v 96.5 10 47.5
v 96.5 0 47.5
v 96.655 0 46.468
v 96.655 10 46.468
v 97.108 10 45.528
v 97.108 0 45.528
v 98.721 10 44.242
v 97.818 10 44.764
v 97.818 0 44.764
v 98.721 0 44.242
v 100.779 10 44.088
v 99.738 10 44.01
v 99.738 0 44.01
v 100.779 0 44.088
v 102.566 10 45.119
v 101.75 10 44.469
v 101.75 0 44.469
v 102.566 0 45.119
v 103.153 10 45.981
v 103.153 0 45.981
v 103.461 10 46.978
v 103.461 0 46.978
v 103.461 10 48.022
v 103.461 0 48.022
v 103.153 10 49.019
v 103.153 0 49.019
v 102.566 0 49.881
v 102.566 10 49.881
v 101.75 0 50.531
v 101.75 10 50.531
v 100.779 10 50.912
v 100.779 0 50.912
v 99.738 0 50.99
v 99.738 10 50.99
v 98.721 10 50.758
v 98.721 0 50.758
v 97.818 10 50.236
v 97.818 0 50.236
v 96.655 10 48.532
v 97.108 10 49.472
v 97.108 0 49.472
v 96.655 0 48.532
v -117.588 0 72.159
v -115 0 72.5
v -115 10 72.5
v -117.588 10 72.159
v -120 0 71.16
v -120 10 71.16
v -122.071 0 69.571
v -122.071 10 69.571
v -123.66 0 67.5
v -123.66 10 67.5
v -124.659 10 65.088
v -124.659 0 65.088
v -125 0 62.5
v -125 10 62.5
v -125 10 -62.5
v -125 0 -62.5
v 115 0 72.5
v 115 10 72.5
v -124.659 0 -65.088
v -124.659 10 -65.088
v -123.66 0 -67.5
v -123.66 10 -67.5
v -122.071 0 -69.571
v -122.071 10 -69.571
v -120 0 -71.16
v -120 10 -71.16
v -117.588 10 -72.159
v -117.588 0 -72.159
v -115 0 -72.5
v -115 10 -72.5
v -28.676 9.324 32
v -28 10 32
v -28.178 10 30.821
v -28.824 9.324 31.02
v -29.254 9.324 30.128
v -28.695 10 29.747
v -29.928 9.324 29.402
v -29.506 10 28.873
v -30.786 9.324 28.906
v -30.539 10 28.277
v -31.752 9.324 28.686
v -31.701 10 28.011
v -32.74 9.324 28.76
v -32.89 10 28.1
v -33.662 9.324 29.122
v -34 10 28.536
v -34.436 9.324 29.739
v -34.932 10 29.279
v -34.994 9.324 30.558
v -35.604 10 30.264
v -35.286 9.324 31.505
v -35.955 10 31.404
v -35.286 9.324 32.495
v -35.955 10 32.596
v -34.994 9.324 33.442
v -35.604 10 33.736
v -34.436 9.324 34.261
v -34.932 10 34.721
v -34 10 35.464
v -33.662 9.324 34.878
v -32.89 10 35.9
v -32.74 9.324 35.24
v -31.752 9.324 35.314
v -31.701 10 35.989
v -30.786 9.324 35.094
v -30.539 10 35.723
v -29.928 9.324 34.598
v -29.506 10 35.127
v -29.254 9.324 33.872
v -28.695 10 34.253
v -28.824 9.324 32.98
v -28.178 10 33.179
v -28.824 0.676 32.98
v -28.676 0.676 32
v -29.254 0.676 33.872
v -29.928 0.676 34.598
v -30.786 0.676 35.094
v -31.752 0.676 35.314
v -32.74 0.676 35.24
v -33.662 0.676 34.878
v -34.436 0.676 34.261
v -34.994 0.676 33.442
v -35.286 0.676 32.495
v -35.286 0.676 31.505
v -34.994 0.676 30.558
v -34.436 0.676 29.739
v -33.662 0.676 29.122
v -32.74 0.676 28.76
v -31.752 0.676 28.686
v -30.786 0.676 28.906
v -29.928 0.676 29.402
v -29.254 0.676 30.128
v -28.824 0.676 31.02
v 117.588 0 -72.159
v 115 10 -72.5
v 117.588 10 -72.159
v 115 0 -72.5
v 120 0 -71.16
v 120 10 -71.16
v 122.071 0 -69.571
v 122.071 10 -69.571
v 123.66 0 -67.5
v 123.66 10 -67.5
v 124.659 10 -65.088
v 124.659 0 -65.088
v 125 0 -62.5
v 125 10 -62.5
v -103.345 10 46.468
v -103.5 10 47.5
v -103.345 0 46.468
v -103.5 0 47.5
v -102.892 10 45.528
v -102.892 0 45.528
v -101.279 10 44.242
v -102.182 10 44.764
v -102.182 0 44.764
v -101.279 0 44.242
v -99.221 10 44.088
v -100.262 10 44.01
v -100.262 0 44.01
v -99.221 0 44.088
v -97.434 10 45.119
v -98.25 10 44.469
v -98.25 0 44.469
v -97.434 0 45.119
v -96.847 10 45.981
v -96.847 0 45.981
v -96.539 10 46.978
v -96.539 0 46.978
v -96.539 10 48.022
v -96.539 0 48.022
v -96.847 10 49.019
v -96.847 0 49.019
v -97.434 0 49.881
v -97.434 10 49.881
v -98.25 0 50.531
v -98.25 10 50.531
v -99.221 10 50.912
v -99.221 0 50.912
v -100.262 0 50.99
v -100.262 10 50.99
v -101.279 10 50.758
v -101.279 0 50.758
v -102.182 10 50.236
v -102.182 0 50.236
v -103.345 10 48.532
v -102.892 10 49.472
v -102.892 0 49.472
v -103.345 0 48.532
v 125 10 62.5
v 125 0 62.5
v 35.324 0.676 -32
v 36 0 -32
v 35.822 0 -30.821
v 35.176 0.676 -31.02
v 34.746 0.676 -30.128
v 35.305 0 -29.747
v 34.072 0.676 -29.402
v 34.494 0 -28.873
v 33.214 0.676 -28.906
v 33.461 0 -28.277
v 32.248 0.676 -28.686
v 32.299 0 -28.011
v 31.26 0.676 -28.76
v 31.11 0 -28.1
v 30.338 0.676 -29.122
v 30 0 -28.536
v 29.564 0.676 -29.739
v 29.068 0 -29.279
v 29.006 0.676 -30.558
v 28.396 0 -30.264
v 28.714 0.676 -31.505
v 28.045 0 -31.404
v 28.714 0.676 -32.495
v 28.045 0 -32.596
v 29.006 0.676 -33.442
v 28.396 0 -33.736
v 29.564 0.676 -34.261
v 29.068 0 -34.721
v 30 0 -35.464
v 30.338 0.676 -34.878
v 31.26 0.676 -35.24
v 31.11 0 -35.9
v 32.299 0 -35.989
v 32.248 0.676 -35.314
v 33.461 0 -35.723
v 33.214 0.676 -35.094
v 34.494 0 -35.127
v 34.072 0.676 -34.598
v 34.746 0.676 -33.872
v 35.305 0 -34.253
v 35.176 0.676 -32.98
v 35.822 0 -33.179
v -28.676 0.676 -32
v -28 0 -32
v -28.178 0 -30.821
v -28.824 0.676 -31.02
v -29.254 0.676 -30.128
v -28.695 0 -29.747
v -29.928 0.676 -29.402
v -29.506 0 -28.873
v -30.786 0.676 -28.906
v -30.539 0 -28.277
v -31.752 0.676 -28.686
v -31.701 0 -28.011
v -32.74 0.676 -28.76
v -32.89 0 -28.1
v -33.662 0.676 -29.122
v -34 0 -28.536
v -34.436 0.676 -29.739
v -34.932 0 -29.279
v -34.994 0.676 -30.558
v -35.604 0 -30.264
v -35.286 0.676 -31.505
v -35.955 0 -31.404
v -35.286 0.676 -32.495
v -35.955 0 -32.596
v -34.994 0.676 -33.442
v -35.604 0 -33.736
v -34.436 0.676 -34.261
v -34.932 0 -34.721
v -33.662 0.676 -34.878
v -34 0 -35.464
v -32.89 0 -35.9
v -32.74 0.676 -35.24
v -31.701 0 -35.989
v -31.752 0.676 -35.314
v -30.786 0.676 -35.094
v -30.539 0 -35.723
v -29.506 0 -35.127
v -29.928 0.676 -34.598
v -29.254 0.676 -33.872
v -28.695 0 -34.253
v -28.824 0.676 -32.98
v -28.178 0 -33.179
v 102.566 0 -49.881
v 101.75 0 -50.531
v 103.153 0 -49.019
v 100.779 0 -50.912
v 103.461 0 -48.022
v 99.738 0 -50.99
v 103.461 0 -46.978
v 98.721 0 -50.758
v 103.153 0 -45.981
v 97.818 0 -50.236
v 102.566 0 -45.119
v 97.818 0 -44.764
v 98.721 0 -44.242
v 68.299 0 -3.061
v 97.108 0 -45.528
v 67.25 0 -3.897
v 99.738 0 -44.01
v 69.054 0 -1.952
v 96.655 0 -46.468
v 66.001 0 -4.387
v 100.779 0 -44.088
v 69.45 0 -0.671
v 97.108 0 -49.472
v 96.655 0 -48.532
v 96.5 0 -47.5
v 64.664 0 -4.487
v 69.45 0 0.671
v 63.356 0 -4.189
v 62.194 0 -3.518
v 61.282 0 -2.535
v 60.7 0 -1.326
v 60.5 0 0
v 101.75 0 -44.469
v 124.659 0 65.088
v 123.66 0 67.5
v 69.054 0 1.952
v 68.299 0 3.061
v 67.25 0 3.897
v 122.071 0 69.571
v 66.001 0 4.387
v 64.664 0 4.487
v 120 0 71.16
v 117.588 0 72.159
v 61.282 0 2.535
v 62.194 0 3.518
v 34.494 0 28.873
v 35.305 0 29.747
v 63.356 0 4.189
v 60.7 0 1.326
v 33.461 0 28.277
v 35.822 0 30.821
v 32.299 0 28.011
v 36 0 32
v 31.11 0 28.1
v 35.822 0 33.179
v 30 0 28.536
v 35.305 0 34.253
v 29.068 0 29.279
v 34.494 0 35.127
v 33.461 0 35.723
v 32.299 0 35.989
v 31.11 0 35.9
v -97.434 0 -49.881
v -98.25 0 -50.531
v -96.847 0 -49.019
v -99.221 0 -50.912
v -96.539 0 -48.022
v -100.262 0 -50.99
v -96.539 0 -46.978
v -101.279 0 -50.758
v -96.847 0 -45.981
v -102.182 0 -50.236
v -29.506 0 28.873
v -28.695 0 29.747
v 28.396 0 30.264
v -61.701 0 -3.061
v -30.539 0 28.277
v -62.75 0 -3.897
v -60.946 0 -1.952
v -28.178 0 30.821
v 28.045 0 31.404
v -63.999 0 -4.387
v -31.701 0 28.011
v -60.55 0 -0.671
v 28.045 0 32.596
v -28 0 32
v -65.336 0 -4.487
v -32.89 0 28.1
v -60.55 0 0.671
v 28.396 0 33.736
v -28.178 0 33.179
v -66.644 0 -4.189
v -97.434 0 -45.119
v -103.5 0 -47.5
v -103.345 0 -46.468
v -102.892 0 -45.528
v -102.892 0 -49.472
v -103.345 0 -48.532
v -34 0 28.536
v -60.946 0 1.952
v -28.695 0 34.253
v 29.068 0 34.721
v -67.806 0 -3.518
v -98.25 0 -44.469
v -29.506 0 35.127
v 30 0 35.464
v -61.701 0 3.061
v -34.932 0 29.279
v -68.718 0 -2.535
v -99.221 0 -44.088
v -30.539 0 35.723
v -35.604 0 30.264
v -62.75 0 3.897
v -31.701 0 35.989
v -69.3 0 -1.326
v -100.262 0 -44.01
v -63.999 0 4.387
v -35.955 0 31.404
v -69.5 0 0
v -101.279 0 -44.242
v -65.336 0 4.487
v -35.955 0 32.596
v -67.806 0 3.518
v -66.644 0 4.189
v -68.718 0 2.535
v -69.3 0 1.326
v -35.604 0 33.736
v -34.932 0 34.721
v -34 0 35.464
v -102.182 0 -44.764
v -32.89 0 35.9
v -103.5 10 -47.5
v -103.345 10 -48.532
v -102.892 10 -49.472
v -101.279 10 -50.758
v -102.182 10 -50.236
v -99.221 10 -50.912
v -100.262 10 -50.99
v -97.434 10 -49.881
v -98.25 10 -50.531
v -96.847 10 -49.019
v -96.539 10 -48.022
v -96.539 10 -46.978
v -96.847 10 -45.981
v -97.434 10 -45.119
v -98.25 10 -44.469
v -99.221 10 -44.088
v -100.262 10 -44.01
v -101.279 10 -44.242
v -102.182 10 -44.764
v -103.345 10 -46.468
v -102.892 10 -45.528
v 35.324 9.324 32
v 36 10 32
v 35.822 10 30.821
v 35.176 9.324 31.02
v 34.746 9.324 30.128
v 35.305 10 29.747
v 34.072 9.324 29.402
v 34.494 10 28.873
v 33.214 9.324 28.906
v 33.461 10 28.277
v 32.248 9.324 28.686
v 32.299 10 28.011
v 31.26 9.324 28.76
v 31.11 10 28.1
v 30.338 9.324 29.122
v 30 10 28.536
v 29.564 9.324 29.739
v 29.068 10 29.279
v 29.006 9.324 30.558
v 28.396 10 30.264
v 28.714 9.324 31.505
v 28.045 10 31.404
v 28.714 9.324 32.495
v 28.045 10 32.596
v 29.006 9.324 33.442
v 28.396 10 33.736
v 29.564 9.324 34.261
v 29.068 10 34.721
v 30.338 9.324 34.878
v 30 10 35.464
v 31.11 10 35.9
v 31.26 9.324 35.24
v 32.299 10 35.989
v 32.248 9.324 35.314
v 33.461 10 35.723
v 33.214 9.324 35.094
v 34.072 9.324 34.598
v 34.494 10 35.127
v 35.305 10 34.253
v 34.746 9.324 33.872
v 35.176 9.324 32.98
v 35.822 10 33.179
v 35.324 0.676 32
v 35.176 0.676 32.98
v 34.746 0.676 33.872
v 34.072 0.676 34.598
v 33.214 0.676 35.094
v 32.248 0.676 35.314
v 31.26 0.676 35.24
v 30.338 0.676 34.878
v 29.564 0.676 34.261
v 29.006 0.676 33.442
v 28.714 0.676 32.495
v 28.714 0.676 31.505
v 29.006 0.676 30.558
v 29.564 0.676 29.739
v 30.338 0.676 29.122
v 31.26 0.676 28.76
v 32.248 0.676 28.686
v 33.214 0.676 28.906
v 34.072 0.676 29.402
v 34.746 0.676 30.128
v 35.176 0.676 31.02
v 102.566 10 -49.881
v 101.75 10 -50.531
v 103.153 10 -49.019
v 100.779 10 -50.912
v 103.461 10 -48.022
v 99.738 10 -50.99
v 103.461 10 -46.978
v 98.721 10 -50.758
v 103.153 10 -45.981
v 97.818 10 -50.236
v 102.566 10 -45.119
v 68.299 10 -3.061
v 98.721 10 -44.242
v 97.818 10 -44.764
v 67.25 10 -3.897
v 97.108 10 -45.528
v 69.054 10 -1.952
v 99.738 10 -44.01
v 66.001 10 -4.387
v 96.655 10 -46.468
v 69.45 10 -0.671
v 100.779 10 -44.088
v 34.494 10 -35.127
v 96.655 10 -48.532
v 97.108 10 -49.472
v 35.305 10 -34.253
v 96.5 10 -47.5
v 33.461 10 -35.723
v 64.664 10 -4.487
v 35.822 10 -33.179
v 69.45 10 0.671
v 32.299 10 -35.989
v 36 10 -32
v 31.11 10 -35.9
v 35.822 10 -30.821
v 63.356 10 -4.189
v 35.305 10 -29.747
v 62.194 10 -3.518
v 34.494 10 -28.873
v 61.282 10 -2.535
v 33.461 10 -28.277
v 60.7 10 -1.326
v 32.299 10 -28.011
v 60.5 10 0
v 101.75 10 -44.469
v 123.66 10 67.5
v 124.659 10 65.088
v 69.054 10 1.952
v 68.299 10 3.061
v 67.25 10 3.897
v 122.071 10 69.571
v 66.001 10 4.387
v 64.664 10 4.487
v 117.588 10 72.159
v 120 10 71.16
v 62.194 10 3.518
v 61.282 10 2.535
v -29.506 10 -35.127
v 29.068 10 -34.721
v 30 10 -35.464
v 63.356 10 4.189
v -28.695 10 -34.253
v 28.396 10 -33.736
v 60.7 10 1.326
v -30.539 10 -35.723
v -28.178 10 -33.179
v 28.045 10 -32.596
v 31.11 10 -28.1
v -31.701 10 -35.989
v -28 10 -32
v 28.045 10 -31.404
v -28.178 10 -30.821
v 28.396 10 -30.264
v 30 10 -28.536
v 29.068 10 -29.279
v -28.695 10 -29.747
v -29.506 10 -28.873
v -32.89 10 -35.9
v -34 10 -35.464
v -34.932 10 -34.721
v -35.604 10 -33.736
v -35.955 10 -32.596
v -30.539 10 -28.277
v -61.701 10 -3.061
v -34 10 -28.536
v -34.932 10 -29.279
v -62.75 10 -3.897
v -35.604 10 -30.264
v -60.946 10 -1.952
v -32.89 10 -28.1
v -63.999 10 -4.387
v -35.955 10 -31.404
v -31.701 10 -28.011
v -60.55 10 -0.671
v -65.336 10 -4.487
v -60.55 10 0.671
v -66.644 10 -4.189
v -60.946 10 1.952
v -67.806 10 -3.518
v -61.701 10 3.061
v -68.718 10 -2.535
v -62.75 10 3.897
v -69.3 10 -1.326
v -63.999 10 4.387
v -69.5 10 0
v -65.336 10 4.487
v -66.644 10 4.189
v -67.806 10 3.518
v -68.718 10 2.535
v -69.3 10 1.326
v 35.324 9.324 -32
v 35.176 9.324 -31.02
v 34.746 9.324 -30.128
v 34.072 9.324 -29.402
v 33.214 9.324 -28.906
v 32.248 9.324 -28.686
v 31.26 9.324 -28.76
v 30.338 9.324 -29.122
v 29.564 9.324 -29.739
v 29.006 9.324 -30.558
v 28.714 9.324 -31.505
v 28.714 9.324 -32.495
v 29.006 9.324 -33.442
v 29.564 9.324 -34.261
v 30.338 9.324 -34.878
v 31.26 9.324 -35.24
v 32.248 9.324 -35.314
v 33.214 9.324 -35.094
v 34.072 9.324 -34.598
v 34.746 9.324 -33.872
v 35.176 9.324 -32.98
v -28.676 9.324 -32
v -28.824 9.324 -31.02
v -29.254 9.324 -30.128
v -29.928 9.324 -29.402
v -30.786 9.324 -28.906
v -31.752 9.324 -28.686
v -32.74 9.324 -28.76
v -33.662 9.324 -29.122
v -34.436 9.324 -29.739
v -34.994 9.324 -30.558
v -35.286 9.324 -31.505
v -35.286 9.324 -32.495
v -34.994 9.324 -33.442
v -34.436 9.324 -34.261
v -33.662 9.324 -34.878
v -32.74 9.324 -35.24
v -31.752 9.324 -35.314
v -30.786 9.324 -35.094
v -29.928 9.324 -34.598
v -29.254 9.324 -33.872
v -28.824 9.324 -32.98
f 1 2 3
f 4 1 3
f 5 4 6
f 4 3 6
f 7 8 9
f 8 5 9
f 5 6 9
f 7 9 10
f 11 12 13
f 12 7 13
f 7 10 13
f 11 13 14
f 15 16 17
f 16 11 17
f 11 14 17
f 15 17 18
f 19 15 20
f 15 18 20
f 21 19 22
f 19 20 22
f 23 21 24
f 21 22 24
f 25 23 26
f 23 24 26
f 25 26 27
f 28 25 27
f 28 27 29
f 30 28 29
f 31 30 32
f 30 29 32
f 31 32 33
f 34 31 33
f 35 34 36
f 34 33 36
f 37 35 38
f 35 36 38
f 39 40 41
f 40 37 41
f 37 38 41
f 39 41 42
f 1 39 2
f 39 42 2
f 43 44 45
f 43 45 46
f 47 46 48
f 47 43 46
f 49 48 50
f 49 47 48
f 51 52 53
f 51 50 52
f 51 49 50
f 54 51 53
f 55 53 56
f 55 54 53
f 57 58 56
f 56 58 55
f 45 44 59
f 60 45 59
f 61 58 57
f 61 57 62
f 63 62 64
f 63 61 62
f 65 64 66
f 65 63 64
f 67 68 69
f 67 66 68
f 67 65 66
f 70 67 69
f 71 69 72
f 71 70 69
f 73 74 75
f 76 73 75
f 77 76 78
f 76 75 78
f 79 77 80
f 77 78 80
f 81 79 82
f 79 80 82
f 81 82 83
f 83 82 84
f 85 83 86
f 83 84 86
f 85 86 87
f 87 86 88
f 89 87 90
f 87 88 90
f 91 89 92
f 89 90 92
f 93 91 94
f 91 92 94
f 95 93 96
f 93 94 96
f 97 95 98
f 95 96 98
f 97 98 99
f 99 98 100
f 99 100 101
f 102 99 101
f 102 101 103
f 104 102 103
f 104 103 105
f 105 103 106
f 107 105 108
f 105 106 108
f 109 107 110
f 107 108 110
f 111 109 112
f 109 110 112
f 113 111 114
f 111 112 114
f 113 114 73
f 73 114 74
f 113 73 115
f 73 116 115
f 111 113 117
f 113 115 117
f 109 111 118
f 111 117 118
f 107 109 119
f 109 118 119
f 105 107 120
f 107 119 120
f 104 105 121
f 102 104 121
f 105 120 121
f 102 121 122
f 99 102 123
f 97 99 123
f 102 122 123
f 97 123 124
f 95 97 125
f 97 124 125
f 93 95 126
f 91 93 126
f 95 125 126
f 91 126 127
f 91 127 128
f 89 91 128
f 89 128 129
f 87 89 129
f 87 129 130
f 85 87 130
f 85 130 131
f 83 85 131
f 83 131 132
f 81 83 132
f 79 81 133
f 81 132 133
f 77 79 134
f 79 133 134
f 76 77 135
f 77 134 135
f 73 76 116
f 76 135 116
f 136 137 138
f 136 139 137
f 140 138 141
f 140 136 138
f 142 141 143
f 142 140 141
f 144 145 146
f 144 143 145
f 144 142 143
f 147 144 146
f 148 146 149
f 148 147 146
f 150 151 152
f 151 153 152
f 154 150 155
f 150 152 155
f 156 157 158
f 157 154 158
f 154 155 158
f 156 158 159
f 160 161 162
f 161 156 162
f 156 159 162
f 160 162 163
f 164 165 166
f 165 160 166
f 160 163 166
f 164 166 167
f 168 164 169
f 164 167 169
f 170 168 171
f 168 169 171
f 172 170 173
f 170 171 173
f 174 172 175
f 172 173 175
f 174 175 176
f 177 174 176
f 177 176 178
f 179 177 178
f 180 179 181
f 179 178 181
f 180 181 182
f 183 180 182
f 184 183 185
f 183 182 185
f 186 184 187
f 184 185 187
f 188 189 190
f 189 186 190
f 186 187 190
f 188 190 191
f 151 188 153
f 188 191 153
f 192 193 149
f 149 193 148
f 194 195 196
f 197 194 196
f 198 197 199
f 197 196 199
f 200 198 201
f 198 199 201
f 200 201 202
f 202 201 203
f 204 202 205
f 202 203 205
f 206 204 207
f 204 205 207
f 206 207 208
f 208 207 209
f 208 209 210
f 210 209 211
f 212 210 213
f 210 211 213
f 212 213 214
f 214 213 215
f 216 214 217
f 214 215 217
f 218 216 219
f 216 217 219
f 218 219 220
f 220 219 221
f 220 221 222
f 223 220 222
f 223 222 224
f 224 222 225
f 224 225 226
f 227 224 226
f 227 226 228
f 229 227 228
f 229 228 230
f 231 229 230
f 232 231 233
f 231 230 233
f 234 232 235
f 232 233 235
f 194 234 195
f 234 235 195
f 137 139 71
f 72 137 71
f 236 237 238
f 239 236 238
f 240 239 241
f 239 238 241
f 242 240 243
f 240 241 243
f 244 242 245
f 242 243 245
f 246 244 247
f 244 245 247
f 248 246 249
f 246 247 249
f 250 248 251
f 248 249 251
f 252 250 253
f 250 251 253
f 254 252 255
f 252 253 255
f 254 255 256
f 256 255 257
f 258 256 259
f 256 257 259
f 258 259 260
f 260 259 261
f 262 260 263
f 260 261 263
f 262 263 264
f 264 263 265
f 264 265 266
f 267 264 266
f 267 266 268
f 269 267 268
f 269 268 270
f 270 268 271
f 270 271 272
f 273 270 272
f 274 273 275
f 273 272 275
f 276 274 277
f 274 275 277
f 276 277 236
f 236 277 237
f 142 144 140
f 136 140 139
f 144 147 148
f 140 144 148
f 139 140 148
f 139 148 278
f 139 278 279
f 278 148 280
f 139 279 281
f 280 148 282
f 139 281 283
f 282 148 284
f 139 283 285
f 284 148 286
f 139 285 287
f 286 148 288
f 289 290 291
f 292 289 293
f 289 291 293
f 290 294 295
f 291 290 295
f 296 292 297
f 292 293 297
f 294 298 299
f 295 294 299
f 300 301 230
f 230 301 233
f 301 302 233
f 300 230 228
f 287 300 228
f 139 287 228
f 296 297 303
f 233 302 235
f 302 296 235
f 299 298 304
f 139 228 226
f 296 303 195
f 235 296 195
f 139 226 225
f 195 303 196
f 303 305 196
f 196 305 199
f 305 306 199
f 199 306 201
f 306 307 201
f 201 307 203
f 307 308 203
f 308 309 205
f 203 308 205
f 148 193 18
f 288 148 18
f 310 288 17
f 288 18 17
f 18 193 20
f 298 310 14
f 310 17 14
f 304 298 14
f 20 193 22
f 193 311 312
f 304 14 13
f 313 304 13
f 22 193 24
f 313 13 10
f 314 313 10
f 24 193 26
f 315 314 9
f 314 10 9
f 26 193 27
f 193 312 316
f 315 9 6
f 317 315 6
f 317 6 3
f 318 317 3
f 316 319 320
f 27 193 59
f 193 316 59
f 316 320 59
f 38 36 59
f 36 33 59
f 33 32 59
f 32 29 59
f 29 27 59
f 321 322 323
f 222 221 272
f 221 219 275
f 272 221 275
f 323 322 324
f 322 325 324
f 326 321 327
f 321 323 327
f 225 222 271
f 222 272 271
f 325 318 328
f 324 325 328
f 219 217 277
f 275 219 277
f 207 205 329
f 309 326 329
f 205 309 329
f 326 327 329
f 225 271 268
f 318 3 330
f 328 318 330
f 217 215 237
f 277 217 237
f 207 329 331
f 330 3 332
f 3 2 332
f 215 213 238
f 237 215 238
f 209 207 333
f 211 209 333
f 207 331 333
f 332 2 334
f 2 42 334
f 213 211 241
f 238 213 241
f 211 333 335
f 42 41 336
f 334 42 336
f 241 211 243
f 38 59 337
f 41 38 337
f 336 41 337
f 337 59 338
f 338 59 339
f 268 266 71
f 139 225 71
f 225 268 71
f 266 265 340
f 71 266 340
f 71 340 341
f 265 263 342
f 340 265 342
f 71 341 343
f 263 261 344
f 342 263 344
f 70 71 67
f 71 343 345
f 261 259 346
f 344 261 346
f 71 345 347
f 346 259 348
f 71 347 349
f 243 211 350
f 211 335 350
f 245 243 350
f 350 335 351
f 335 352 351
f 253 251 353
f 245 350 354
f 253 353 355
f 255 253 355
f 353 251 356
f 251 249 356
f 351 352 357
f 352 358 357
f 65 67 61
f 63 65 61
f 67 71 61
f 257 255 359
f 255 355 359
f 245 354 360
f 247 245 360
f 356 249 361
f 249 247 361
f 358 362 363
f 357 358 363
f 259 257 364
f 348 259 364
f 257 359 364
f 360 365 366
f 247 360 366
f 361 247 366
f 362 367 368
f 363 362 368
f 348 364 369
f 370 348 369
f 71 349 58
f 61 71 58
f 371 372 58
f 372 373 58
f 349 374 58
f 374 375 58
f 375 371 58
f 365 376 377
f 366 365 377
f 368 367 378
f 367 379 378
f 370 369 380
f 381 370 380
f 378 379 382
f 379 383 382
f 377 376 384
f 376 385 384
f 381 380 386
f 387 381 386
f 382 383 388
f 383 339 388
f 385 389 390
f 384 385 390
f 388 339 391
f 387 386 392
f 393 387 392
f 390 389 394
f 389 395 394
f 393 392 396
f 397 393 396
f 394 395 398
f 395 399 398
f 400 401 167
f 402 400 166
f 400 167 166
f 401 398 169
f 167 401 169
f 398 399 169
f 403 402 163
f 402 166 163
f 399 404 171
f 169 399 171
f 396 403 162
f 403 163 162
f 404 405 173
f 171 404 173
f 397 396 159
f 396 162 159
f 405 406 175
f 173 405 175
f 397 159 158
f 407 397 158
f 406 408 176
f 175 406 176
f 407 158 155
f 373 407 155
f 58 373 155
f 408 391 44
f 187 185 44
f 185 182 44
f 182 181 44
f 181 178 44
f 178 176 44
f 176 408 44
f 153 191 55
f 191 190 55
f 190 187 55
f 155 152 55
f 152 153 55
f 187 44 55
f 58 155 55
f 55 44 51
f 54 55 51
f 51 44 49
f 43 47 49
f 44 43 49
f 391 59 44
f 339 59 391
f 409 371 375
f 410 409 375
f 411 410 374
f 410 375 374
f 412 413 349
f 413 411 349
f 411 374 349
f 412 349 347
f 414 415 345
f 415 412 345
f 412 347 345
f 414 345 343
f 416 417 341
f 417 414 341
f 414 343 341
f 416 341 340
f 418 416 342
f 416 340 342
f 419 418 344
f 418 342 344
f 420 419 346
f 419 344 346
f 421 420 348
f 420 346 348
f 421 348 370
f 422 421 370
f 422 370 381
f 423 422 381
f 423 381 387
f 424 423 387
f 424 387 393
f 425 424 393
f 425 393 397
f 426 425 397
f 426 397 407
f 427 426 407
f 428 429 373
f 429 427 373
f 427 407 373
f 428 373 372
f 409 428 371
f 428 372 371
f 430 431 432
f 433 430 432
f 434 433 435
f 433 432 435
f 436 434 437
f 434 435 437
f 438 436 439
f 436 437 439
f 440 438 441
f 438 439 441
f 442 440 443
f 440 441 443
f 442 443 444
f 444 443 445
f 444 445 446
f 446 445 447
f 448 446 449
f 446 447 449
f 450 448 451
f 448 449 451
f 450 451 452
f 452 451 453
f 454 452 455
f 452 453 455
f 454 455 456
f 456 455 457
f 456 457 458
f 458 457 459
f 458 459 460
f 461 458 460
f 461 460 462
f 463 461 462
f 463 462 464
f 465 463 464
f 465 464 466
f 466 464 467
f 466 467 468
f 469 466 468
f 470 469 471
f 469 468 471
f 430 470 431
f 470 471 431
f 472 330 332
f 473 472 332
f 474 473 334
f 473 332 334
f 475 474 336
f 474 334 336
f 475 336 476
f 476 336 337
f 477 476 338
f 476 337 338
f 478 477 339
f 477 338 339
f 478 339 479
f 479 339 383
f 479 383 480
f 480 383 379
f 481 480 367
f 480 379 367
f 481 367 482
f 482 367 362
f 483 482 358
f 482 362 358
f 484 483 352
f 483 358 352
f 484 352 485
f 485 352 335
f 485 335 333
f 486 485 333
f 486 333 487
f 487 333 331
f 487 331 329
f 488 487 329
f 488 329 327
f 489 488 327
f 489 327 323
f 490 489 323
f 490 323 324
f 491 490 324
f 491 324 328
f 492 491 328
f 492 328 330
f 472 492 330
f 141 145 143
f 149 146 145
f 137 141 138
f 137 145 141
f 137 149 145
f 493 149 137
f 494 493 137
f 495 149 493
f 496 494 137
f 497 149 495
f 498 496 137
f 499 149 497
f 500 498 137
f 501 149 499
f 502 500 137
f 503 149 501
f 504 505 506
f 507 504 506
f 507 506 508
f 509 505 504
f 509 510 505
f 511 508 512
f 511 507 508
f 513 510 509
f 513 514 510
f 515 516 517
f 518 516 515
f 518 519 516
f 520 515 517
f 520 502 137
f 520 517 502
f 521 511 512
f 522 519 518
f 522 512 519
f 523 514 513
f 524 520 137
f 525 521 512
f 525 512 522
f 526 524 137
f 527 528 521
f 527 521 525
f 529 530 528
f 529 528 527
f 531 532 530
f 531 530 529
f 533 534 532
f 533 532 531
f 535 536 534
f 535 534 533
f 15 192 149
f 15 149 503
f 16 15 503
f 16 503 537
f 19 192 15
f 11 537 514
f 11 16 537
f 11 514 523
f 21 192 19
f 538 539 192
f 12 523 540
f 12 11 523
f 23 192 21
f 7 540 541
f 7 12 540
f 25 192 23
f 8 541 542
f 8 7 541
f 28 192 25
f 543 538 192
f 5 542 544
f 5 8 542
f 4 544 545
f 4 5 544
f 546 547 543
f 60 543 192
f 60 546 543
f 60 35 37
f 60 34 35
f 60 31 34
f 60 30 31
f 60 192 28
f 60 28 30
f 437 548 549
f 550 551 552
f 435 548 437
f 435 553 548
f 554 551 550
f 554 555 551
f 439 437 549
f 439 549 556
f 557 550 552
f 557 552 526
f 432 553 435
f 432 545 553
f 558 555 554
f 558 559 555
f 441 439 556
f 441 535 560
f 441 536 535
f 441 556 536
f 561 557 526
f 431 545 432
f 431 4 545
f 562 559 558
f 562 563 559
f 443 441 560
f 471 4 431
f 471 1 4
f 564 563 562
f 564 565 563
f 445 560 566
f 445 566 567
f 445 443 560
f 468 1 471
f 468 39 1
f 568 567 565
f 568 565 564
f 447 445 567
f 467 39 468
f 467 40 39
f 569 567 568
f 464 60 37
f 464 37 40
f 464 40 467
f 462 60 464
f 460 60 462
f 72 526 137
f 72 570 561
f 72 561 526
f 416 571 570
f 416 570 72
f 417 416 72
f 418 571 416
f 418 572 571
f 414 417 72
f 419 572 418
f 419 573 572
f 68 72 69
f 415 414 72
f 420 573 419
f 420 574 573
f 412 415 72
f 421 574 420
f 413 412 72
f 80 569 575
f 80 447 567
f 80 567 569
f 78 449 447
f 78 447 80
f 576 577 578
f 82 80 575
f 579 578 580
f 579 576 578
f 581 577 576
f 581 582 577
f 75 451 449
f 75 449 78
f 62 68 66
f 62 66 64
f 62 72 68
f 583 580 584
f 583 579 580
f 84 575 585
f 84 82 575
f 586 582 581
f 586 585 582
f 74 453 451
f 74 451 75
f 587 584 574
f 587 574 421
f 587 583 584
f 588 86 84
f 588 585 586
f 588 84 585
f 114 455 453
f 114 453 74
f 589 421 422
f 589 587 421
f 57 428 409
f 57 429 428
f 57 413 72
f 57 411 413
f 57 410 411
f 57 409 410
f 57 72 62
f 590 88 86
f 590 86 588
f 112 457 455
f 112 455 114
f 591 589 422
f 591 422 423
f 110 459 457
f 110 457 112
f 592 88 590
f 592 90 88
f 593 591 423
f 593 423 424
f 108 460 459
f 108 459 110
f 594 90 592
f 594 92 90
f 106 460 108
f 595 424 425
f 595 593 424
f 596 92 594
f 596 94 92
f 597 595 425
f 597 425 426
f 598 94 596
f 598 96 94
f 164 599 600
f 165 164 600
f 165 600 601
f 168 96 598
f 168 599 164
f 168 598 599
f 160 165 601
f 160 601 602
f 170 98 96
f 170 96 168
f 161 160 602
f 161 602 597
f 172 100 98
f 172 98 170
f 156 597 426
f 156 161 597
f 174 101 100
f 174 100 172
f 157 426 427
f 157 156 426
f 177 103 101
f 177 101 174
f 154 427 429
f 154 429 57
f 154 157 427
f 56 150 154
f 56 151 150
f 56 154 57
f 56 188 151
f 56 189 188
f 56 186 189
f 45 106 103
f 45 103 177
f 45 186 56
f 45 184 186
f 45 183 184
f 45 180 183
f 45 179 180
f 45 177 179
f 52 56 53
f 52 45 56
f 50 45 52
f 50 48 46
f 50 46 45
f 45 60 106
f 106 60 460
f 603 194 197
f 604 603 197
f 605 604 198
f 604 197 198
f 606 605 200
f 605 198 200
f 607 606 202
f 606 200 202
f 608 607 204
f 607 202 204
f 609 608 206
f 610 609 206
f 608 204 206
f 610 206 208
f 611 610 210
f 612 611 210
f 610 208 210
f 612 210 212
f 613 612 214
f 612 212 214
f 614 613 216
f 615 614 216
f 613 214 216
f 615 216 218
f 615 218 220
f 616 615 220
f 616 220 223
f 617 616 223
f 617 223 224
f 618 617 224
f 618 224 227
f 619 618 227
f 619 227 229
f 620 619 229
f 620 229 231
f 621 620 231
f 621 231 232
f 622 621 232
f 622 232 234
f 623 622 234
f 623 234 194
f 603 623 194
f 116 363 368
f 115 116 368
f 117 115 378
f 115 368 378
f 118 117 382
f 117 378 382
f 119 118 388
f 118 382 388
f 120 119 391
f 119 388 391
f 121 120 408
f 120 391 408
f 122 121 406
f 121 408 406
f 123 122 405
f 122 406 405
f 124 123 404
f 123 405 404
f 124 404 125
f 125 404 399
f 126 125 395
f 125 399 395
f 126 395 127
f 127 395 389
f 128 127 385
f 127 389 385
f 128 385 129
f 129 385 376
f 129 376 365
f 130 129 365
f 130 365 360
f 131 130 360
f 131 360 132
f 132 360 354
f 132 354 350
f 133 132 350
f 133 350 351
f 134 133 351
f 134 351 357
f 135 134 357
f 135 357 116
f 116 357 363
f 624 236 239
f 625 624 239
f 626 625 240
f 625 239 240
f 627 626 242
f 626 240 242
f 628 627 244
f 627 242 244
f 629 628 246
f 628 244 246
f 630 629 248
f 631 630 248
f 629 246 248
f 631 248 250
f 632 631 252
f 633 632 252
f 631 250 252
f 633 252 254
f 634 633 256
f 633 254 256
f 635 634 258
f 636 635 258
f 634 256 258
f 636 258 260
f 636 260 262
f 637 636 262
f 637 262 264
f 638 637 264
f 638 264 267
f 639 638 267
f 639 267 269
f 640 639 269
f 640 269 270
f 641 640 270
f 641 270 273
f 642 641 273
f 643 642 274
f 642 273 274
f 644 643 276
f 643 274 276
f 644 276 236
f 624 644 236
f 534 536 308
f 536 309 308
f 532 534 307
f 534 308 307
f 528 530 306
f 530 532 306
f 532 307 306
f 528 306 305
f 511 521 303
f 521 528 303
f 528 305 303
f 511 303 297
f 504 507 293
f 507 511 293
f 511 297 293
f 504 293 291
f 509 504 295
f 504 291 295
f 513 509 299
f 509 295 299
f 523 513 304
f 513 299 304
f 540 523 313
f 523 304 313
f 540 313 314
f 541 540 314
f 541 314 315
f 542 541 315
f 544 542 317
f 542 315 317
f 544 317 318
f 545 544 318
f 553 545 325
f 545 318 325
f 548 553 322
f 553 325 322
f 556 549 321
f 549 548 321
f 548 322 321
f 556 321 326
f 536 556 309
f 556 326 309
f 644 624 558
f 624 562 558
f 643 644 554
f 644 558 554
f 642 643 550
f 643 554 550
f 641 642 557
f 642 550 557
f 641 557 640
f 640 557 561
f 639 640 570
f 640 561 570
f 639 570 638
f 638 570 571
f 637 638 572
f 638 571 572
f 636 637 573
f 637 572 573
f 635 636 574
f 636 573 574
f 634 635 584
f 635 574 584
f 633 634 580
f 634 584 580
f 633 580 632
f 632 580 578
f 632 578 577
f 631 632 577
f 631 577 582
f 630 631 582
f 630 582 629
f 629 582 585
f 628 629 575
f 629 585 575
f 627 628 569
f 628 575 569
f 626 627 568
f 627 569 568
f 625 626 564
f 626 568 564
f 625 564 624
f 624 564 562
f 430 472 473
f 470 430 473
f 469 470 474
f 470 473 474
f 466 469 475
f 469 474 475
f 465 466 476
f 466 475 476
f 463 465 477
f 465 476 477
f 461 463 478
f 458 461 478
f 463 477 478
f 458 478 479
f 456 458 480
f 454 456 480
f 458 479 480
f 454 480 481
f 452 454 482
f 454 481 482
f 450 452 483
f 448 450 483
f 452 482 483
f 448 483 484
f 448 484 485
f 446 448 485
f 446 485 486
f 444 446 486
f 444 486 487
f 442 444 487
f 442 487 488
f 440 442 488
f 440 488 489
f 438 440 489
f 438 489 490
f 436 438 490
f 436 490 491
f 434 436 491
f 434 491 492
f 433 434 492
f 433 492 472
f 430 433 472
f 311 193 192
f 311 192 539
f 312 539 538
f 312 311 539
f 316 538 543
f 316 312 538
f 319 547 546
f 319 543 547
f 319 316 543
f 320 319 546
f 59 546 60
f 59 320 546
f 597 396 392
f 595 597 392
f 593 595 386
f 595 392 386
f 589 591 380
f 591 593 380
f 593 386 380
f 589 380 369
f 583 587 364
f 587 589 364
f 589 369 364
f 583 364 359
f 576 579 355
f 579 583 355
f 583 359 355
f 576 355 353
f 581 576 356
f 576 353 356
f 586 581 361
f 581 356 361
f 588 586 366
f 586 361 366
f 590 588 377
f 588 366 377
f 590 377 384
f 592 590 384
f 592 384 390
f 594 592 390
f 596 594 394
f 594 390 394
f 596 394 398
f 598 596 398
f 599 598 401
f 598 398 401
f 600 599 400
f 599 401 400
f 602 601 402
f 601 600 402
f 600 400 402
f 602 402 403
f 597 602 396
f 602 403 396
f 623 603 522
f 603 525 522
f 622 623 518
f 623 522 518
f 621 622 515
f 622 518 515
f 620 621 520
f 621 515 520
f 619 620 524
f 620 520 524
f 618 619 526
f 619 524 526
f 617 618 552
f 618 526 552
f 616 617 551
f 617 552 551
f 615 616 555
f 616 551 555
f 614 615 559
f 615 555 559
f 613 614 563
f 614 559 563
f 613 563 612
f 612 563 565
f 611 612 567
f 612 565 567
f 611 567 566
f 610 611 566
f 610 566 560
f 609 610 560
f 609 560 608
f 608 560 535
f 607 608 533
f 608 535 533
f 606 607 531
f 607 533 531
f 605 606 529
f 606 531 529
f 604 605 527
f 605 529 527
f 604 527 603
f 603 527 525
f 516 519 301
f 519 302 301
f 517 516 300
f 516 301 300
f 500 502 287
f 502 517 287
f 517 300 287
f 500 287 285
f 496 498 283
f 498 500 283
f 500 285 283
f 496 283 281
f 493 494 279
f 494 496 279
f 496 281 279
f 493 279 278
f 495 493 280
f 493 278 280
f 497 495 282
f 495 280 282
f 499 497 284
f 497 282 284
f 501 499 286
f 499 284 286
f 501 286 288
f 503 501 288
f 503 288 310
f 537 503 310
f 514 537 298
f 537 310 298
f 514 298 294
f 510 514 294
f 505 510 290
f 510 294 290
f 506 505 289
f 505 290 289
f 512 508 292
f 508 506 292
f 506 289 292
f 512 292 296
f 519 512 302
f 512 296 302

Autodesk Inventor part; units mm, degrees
sketch "Sketch_1" plane through (0, 0, 0) normal (0, 1, 0) x (-1, 0, 0)
  arc A0 (125, 62.5) -> (115, 72.5) centre (115, 62.5) ccw
  line L0 (115, 72.5) -> (-115, 72.5)
  arc A1 (-115, 72.5) -> (-125, 62.5) centre (-115, 62.5) ccw
  line L1 (-125, 62.5) -> (-125, -62.5)
  arc A2 (-125, -62.5) -> (-115, -72.5) centre (-115, -62.5) ccw
  line L2 (-115, -72.5) -> (115, -72.5)
  arc A3 (115, -72.5) -> (125, -62.5) centre (115, -62.5) ccw
  line L3 (125, -62.5) -> (125, 62.5)
  circle A4 centre (-100, -47.5) radius 3.5
  circle A5 centre (-100, 47.5) radius 3.5
  circle A6 centre (-65, 0) radius 4.5
  circle A7 centre (65, 0) radius 4.5
  circle A8 centre (100, -47.5) radius 3.5
  circle A9 centre (100, 47.5) radius 3.5
extrude "Extrusion1" add sketch "Sketch_1" along normal blind 10
sketch "Sketch_9" plane through (0, 0, -32) normal (0, 0, 1) x (1, 0, 0)
  line L0 (-32, 0) -> (-32, 10)
  line L1 (-32, 10) -> (-28, 10)
  line L2 (-28, 10) -> (-28.6765, 9.3235)
  line L3 (-28.6765, 9.3235) -> (-28.6765, 0.6765)
  line L4 (-28.6765, 0.6765) -> (-28, 0)
  line L5 (-28, 0) -> (-32, 0)
  line L6 (-32, 0) -> (-32, 10)
revolve "Revolution1" cut sketch "Sketch_9" angle 360 about axis through (-32, 0, -32) along (0, -1, 0)
thread "Thread1" size "M8x1.25" class "6H" standard "ISO Metric profile" full length
sketch "Sketch_10" plane through (0, 0, -32) normal (0, 0, 1) x (1, 0, 0)
  line L0 (32, 0) -> (32, 10)
  line L1 (32, 10) -> (36, 10)
  line L2 (36, 10) -> (35.3235, 9.3235)
  line L3 (35.3235, 9.3235) -> (35.3235, 0.6765)
  line L4 (35.3235, 0.6765) -> (36, 0)
  line L5 (36, 0) -> (32, 0)
  line L6 (32, 0) -> (32, 10)
revolve "Revolution2" cut sketch "Sketch_10" angle 360 about axis through (32, 0, -32) along (0, -1, 0)
thread "Thread2" size "M8x1.25" class "6H" standard "ISO Metric profile" full length
sketch "Sketch_11" plane through (0, 0, 32) normal (0, 0, 1) x (1, 0, 0)
  line L0 (-32, 0) -> (-32, 10)
  line L1 (-32, 10) -> (-28, 10)
  line L2 (-28, 10) -> (-28.6765, 9.3235)
  line L3 (-28.6765, 9.3235) -> (-28.6765, 0.6765)
  line L4 (-28.6765, 0.6765) -> (-28, 0)
  line L5 (-28, 0) -> (-32, 0)
  line L6 (-32, 0) -> (-32, 10)
revolve "Revolution3" cut sketch "Sketch_11" angle 360 about axis through (-32, 0, 32) along (0, -1, 0)
thread "Thread3" size "M8x1.25" class "6H" standard "ISO Metric profile" full length
sketch "Sketch_12" plane through (0, 0, 32) normal (0, 0, 1) x (1, 0, 0)
  line L0 (32, 0) -> (32, 10)
  line L1 (32, 10) -> (36, 10)
  line L2 (36, 10) -> (35.3235, 9.3235)
  line L3 (35.3235, 9.3235) -> (35.3235, 0.6765)
  line L4 (35.3235, 0.6765) -> (36, 0)
  line L5 (36, 0) -> (32, 0)
  line L6 (32, 0) -> (32, 10)
revolve "Revolution4" cut sketch "Sketch_12" angle 360 about axis through (32, 0, 32) along (0, -1, 0)
thread "Thread4" size "M8x1.25" class "6H" standard "ISO Metric profile" full length
ref_plane "PLATTE_XY" through (0, 0, 0) normal (0, 1, 0) x (1, 0, 0)
ref_plane "PLATTE_YZ" through (0, 0, 0) normal (1, 0, 0) x (0, 0, -1)
ref_plane "PLATTE_ZX" through (0, 0, 0) normal (0, 0, -1) x (0, 1, 0)
properties part number "31000133platte"
